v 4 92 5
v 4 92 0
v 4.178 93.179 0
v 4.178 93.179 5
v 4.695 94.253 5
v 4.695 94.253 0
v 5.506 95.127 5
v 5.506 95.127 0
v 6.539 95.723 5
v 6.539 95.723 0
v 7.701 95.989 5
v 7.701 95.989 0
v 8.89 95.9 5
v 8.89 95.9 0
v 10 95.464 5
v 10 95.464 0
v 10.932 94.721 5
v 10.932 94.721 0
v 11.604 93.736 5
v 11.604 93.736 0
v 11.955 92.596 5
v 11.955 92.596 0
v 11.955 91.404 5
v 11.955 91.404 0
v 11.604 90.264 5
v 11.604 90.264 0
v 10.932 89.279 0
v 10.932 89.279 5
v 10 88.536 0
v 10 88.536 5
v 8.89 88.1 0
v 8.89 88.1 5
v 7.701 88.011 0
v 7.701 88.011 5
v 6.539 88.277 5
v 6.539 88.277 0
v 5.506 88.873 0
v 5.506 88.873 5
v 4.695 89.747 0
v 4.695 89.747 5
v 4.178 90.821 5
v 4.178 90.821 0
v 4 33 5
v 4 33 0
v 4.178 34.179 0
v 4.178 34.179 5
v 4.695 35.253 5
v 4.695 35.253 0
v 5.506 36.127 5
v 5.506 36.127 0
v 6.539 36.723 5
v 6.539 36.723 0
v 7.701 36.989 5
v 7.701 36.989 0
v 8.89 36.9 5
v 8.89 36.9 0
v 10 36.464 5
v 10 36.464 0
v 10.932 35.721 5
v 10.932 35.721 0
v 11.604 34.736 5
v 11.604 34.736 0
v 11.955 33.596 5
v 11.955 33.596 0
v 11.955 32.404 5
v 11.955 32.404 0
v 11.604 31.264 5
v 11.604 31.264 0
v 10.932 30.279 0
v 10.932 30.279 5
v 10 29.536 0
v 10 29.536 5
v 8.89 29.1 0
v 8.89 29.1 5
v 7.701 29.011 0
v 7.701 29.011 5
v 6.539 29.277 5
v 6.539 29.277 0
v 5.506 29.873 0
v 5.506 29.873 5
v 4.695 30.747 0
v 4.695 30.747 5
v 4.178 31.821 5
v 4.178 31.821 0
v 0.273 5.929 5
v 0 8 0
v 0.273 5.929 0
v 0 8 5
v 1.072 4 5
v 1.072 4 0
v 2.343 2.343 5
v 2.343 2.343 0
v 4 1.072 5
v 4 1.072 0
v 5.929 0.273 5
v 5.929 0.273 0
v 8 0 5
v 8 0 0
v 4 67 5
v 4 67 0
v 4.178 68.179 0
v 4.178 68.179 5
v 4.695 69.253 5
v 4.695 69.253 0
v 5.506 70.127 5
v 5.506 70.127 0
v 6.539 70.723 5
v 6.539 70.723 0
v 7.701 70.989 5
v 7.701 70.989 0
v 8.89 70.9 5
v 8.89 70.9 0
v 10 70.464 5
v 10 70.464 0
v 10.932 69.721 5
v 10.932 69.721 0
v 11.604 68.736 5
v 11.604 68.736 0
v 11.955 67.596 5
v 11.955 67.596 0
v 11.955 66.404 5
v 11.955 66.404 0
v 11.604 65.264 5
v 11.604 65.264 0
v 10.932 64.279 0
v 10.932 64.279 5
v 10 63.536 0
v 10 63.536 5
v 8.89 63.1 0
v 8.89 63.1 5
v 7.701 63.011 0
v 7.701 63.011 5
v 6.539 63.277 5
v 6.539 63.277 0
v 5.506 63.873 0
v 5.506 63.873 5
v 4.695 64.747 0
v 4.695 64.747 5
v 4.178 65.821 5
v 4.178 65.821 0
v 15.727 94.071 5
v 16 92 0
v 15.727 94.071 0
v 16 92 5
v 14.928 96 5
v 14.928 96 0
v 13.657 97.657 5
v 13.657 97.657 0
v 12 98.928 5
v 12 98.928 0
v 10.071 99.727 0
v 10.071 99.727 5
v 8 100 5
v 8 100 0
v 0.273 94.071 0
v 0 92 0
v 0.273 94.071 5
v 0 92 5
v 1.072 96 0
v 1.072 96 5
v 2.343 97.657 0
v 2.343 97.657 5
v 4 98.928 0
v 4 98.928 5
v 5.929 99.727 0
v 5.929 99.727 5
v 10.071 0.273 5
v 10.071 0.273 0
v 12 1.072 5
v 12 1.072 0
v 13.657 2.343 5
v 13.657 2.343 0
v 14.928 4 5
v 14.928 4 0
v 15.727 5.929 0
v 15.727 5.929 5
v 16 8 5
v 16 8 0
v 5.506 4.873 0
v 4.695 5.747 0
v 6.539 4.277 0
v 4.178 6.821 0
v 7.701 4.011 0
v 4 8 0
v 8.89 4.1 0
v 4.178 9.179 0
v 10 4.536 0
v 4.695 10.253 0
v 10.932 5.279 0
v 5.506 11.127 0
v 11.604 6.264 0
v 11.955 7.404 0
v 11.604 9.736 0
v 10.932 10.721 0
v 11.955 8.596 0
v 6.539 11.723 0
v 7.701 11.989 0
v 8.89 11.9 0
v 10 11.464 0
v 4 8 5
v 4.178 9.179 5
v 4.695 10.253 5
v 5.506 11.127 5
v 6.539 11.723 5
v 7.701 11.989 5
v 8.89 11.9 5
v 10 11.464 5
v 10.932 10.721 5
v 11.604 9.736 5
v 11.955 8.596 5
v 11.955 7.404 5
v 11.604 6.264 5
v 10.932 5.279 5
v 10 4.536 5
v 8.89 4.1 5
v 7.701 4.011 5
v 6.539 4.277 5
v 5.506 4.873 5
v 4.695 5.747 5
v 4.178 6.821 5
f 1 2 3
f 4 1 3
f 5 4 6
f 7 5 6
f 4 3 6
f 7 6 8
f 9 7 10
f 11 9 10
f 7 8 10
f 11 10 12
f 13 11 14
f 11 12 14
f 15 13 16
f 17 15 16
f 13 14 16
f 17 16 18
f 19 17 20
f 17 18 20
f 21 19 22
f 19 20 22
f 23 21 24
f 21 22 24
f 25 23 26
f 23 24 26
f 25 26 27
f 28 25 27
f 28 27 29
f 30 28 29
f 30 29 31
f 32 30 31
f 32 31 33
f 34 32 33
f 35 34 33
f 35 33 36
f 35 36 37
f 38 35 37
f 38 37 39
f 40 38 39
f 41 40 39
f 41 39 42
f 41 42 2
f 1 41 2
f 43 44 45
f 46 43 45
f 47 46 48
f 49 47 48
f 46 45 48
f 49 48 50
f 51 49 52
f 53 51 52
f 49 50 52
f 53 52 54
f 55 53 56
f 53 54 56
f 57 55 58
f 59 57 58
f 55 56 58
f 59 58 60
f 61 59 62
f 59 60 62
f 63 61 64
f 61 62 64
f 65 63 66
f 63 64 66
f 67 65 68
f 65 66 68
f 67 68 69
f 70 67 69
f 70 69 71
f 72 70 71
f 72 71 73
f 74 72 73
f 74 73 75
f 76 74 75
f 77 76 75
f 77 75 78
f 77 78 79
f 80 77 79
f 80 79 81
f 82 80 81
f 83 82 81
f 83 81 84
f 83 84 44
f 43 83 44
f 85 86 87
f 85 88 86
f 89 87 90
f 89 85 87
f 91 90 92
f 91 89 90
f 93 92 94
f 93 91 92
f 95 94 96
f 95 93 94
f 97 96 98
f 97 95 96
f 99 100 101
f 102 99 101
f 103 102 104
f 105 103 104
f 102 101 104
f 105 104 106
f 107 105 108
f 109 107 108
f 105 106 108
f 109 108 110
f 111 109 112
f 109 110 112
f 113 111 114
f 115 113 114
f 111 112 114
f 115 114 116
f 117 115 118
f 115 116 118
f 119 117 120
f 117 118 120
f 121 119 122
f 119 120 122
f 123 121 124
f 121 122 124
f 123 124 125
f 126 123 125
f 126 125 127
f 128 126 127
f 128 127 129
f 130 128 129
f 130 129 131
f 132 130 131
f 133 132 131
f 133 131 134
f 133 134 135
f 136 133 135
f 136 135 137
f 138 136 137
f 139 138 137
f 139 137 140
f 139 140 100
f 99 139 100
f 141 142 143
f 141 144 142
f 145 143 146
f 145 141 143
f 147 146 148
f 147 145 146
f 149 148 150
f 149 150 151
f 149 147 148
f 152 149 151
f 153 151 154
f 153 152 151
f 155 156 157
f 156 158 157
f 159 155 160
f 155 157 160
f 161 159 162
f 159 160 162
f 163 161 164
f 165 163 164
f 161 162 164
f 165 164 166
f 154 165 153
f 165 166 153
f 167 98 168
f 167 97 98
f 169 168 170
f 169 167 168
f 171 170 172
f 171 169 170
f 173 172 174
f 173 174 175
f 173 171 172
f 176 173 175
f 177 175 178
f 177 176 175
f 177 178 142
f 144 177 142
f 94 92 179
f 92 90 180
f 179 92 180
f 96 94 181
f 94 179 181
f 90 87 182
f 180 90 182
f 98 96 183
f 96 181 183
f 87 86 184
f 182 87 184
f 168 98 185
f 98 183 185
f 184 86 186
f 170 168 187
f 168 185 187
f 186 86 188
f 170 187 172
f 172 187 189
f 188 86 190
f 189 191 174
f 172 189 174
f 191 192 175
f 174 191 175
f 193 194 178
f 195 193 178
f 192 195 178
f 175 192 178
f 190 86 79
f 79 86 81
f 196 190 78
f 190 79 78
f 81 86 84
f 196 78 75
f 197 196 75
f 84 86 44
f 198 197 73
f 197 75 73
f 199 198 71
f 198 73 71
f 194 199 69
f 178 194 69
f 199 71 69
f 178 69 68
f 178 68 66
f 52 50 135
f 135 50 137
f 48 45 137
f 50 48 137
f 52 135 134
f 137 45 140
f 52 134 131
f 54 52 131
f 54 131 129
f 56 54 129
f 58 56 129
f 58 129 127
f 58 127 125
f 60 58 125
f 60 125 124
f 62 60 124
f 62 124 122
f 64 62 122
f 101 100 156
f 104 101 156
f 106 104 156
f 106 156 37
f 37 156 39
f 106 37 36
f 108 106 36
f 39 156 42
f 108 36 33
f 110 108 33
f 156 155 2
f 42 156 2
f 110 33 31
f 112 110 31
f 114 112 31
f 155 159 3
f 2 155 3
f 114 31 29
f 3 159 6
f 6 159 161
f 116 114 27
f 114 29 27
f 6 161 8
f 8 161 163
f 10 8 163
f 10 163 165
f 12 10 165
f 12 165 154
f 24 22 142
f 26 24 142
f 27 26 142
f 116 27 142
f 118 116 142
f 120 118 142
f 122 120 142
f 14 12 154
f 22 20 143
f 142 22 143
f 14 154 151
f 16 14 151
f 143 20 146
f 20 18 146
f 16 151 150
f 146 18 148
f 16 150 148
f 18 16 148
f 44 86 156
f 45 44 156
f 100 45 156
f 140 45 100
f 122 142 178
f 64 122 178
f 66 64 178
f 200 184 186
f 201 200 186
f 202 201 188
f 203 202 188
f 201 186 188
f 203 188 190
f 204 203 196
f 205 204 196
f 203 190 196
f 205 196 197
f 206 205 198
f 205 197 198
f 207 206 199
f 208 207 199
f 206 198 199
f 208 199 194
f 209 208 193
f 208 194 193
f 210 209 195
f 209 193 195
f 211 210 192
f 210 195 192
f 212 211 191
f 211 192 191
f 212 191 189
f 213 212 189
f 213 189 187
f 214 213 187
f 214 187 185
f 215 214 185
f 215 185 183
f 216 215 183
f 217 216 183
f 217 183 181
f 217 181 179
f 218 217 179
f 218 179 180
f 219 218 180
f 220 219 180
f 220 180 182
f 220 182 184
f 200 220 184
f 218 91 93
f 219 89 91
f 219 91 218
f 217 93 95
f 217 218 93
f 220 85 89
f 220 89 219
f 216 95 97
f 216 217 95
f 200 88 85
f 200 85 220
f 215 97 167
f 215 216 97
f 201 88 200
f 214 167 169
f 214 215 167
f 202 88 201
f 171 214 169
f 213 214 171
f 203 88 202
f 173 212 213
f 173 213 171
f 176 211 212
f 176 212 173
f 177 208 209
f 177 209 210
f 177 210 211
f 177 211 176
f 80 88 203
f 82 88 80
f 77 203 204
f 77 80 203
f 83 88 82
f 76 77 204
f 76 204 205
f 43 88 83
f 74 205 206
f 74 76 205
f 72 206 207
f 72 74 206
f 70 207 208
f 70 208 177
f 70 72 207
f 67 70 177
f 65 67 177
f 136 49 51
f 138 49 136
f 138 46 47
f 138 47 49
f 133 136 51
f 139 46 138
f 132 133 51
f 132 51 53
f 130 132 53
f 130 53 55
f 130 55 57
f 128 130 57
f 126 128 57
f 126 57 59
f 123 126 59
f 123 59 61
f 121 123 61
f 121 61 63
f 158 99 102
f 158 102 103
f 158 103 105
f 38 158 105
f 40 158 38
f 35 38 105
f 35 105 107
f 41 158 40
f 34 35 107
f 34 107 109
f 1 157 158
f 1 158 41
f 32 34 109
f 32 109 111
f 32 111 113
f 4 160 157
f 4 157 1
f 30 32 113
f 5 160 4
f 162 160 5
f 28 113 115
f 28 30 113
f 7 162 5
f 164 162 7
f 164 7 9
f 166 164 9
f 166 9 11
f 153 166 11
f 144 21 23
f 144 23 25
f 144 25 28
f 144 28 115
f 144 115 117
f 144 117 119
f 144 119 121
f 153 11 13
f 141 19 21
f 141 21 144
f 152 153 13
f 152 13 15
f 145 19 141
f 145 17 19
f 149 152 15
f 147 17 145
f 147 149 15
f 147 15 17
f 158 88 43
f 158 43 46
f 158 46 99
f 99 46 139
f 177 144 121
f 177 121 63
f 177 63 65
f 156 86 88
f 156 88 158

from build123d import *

# Parameters (mm, degrees)
F0_W     = 16
F0_H     = 100
F1_DEPTH = 5
F2_R     = 7.99999
F4_D     = 8


# Not quite as in the source:
# - a fillet or chamfer is up to 0.001 mm smaller than in the source, because OpenCascade refuses the exact size


with BuildPart() as f1:
    # F0 (on Top) → F1 (new body)
    with BuildSketch(Plane.XY):
        with Locations((8, 50)):
            Rectangle(F0_W, F0_H)
    extrude(amount=F1_DEPTH)

    # F2 (radius 8 in the source; OpenCascade refuses exactly that, so slightly less here)
    f2_edges = [f1.edges().sort_by_distance(p)[0] for p in [
        (16, 0, 2.5),
        (0, 0, 2.5),
        (16, 100, 2.5),
        (0, 100, 2.5),
    ]]
    fillet(f2_edges, radius=F2_R)

    # F4 (through all)
    with Locations(Plane.XY.offset(5)):
        with Locations((8, 92), (8, 67), (8, 33), (8, 8)):
            Hole(F4_D / 2)


solid = f1.part
